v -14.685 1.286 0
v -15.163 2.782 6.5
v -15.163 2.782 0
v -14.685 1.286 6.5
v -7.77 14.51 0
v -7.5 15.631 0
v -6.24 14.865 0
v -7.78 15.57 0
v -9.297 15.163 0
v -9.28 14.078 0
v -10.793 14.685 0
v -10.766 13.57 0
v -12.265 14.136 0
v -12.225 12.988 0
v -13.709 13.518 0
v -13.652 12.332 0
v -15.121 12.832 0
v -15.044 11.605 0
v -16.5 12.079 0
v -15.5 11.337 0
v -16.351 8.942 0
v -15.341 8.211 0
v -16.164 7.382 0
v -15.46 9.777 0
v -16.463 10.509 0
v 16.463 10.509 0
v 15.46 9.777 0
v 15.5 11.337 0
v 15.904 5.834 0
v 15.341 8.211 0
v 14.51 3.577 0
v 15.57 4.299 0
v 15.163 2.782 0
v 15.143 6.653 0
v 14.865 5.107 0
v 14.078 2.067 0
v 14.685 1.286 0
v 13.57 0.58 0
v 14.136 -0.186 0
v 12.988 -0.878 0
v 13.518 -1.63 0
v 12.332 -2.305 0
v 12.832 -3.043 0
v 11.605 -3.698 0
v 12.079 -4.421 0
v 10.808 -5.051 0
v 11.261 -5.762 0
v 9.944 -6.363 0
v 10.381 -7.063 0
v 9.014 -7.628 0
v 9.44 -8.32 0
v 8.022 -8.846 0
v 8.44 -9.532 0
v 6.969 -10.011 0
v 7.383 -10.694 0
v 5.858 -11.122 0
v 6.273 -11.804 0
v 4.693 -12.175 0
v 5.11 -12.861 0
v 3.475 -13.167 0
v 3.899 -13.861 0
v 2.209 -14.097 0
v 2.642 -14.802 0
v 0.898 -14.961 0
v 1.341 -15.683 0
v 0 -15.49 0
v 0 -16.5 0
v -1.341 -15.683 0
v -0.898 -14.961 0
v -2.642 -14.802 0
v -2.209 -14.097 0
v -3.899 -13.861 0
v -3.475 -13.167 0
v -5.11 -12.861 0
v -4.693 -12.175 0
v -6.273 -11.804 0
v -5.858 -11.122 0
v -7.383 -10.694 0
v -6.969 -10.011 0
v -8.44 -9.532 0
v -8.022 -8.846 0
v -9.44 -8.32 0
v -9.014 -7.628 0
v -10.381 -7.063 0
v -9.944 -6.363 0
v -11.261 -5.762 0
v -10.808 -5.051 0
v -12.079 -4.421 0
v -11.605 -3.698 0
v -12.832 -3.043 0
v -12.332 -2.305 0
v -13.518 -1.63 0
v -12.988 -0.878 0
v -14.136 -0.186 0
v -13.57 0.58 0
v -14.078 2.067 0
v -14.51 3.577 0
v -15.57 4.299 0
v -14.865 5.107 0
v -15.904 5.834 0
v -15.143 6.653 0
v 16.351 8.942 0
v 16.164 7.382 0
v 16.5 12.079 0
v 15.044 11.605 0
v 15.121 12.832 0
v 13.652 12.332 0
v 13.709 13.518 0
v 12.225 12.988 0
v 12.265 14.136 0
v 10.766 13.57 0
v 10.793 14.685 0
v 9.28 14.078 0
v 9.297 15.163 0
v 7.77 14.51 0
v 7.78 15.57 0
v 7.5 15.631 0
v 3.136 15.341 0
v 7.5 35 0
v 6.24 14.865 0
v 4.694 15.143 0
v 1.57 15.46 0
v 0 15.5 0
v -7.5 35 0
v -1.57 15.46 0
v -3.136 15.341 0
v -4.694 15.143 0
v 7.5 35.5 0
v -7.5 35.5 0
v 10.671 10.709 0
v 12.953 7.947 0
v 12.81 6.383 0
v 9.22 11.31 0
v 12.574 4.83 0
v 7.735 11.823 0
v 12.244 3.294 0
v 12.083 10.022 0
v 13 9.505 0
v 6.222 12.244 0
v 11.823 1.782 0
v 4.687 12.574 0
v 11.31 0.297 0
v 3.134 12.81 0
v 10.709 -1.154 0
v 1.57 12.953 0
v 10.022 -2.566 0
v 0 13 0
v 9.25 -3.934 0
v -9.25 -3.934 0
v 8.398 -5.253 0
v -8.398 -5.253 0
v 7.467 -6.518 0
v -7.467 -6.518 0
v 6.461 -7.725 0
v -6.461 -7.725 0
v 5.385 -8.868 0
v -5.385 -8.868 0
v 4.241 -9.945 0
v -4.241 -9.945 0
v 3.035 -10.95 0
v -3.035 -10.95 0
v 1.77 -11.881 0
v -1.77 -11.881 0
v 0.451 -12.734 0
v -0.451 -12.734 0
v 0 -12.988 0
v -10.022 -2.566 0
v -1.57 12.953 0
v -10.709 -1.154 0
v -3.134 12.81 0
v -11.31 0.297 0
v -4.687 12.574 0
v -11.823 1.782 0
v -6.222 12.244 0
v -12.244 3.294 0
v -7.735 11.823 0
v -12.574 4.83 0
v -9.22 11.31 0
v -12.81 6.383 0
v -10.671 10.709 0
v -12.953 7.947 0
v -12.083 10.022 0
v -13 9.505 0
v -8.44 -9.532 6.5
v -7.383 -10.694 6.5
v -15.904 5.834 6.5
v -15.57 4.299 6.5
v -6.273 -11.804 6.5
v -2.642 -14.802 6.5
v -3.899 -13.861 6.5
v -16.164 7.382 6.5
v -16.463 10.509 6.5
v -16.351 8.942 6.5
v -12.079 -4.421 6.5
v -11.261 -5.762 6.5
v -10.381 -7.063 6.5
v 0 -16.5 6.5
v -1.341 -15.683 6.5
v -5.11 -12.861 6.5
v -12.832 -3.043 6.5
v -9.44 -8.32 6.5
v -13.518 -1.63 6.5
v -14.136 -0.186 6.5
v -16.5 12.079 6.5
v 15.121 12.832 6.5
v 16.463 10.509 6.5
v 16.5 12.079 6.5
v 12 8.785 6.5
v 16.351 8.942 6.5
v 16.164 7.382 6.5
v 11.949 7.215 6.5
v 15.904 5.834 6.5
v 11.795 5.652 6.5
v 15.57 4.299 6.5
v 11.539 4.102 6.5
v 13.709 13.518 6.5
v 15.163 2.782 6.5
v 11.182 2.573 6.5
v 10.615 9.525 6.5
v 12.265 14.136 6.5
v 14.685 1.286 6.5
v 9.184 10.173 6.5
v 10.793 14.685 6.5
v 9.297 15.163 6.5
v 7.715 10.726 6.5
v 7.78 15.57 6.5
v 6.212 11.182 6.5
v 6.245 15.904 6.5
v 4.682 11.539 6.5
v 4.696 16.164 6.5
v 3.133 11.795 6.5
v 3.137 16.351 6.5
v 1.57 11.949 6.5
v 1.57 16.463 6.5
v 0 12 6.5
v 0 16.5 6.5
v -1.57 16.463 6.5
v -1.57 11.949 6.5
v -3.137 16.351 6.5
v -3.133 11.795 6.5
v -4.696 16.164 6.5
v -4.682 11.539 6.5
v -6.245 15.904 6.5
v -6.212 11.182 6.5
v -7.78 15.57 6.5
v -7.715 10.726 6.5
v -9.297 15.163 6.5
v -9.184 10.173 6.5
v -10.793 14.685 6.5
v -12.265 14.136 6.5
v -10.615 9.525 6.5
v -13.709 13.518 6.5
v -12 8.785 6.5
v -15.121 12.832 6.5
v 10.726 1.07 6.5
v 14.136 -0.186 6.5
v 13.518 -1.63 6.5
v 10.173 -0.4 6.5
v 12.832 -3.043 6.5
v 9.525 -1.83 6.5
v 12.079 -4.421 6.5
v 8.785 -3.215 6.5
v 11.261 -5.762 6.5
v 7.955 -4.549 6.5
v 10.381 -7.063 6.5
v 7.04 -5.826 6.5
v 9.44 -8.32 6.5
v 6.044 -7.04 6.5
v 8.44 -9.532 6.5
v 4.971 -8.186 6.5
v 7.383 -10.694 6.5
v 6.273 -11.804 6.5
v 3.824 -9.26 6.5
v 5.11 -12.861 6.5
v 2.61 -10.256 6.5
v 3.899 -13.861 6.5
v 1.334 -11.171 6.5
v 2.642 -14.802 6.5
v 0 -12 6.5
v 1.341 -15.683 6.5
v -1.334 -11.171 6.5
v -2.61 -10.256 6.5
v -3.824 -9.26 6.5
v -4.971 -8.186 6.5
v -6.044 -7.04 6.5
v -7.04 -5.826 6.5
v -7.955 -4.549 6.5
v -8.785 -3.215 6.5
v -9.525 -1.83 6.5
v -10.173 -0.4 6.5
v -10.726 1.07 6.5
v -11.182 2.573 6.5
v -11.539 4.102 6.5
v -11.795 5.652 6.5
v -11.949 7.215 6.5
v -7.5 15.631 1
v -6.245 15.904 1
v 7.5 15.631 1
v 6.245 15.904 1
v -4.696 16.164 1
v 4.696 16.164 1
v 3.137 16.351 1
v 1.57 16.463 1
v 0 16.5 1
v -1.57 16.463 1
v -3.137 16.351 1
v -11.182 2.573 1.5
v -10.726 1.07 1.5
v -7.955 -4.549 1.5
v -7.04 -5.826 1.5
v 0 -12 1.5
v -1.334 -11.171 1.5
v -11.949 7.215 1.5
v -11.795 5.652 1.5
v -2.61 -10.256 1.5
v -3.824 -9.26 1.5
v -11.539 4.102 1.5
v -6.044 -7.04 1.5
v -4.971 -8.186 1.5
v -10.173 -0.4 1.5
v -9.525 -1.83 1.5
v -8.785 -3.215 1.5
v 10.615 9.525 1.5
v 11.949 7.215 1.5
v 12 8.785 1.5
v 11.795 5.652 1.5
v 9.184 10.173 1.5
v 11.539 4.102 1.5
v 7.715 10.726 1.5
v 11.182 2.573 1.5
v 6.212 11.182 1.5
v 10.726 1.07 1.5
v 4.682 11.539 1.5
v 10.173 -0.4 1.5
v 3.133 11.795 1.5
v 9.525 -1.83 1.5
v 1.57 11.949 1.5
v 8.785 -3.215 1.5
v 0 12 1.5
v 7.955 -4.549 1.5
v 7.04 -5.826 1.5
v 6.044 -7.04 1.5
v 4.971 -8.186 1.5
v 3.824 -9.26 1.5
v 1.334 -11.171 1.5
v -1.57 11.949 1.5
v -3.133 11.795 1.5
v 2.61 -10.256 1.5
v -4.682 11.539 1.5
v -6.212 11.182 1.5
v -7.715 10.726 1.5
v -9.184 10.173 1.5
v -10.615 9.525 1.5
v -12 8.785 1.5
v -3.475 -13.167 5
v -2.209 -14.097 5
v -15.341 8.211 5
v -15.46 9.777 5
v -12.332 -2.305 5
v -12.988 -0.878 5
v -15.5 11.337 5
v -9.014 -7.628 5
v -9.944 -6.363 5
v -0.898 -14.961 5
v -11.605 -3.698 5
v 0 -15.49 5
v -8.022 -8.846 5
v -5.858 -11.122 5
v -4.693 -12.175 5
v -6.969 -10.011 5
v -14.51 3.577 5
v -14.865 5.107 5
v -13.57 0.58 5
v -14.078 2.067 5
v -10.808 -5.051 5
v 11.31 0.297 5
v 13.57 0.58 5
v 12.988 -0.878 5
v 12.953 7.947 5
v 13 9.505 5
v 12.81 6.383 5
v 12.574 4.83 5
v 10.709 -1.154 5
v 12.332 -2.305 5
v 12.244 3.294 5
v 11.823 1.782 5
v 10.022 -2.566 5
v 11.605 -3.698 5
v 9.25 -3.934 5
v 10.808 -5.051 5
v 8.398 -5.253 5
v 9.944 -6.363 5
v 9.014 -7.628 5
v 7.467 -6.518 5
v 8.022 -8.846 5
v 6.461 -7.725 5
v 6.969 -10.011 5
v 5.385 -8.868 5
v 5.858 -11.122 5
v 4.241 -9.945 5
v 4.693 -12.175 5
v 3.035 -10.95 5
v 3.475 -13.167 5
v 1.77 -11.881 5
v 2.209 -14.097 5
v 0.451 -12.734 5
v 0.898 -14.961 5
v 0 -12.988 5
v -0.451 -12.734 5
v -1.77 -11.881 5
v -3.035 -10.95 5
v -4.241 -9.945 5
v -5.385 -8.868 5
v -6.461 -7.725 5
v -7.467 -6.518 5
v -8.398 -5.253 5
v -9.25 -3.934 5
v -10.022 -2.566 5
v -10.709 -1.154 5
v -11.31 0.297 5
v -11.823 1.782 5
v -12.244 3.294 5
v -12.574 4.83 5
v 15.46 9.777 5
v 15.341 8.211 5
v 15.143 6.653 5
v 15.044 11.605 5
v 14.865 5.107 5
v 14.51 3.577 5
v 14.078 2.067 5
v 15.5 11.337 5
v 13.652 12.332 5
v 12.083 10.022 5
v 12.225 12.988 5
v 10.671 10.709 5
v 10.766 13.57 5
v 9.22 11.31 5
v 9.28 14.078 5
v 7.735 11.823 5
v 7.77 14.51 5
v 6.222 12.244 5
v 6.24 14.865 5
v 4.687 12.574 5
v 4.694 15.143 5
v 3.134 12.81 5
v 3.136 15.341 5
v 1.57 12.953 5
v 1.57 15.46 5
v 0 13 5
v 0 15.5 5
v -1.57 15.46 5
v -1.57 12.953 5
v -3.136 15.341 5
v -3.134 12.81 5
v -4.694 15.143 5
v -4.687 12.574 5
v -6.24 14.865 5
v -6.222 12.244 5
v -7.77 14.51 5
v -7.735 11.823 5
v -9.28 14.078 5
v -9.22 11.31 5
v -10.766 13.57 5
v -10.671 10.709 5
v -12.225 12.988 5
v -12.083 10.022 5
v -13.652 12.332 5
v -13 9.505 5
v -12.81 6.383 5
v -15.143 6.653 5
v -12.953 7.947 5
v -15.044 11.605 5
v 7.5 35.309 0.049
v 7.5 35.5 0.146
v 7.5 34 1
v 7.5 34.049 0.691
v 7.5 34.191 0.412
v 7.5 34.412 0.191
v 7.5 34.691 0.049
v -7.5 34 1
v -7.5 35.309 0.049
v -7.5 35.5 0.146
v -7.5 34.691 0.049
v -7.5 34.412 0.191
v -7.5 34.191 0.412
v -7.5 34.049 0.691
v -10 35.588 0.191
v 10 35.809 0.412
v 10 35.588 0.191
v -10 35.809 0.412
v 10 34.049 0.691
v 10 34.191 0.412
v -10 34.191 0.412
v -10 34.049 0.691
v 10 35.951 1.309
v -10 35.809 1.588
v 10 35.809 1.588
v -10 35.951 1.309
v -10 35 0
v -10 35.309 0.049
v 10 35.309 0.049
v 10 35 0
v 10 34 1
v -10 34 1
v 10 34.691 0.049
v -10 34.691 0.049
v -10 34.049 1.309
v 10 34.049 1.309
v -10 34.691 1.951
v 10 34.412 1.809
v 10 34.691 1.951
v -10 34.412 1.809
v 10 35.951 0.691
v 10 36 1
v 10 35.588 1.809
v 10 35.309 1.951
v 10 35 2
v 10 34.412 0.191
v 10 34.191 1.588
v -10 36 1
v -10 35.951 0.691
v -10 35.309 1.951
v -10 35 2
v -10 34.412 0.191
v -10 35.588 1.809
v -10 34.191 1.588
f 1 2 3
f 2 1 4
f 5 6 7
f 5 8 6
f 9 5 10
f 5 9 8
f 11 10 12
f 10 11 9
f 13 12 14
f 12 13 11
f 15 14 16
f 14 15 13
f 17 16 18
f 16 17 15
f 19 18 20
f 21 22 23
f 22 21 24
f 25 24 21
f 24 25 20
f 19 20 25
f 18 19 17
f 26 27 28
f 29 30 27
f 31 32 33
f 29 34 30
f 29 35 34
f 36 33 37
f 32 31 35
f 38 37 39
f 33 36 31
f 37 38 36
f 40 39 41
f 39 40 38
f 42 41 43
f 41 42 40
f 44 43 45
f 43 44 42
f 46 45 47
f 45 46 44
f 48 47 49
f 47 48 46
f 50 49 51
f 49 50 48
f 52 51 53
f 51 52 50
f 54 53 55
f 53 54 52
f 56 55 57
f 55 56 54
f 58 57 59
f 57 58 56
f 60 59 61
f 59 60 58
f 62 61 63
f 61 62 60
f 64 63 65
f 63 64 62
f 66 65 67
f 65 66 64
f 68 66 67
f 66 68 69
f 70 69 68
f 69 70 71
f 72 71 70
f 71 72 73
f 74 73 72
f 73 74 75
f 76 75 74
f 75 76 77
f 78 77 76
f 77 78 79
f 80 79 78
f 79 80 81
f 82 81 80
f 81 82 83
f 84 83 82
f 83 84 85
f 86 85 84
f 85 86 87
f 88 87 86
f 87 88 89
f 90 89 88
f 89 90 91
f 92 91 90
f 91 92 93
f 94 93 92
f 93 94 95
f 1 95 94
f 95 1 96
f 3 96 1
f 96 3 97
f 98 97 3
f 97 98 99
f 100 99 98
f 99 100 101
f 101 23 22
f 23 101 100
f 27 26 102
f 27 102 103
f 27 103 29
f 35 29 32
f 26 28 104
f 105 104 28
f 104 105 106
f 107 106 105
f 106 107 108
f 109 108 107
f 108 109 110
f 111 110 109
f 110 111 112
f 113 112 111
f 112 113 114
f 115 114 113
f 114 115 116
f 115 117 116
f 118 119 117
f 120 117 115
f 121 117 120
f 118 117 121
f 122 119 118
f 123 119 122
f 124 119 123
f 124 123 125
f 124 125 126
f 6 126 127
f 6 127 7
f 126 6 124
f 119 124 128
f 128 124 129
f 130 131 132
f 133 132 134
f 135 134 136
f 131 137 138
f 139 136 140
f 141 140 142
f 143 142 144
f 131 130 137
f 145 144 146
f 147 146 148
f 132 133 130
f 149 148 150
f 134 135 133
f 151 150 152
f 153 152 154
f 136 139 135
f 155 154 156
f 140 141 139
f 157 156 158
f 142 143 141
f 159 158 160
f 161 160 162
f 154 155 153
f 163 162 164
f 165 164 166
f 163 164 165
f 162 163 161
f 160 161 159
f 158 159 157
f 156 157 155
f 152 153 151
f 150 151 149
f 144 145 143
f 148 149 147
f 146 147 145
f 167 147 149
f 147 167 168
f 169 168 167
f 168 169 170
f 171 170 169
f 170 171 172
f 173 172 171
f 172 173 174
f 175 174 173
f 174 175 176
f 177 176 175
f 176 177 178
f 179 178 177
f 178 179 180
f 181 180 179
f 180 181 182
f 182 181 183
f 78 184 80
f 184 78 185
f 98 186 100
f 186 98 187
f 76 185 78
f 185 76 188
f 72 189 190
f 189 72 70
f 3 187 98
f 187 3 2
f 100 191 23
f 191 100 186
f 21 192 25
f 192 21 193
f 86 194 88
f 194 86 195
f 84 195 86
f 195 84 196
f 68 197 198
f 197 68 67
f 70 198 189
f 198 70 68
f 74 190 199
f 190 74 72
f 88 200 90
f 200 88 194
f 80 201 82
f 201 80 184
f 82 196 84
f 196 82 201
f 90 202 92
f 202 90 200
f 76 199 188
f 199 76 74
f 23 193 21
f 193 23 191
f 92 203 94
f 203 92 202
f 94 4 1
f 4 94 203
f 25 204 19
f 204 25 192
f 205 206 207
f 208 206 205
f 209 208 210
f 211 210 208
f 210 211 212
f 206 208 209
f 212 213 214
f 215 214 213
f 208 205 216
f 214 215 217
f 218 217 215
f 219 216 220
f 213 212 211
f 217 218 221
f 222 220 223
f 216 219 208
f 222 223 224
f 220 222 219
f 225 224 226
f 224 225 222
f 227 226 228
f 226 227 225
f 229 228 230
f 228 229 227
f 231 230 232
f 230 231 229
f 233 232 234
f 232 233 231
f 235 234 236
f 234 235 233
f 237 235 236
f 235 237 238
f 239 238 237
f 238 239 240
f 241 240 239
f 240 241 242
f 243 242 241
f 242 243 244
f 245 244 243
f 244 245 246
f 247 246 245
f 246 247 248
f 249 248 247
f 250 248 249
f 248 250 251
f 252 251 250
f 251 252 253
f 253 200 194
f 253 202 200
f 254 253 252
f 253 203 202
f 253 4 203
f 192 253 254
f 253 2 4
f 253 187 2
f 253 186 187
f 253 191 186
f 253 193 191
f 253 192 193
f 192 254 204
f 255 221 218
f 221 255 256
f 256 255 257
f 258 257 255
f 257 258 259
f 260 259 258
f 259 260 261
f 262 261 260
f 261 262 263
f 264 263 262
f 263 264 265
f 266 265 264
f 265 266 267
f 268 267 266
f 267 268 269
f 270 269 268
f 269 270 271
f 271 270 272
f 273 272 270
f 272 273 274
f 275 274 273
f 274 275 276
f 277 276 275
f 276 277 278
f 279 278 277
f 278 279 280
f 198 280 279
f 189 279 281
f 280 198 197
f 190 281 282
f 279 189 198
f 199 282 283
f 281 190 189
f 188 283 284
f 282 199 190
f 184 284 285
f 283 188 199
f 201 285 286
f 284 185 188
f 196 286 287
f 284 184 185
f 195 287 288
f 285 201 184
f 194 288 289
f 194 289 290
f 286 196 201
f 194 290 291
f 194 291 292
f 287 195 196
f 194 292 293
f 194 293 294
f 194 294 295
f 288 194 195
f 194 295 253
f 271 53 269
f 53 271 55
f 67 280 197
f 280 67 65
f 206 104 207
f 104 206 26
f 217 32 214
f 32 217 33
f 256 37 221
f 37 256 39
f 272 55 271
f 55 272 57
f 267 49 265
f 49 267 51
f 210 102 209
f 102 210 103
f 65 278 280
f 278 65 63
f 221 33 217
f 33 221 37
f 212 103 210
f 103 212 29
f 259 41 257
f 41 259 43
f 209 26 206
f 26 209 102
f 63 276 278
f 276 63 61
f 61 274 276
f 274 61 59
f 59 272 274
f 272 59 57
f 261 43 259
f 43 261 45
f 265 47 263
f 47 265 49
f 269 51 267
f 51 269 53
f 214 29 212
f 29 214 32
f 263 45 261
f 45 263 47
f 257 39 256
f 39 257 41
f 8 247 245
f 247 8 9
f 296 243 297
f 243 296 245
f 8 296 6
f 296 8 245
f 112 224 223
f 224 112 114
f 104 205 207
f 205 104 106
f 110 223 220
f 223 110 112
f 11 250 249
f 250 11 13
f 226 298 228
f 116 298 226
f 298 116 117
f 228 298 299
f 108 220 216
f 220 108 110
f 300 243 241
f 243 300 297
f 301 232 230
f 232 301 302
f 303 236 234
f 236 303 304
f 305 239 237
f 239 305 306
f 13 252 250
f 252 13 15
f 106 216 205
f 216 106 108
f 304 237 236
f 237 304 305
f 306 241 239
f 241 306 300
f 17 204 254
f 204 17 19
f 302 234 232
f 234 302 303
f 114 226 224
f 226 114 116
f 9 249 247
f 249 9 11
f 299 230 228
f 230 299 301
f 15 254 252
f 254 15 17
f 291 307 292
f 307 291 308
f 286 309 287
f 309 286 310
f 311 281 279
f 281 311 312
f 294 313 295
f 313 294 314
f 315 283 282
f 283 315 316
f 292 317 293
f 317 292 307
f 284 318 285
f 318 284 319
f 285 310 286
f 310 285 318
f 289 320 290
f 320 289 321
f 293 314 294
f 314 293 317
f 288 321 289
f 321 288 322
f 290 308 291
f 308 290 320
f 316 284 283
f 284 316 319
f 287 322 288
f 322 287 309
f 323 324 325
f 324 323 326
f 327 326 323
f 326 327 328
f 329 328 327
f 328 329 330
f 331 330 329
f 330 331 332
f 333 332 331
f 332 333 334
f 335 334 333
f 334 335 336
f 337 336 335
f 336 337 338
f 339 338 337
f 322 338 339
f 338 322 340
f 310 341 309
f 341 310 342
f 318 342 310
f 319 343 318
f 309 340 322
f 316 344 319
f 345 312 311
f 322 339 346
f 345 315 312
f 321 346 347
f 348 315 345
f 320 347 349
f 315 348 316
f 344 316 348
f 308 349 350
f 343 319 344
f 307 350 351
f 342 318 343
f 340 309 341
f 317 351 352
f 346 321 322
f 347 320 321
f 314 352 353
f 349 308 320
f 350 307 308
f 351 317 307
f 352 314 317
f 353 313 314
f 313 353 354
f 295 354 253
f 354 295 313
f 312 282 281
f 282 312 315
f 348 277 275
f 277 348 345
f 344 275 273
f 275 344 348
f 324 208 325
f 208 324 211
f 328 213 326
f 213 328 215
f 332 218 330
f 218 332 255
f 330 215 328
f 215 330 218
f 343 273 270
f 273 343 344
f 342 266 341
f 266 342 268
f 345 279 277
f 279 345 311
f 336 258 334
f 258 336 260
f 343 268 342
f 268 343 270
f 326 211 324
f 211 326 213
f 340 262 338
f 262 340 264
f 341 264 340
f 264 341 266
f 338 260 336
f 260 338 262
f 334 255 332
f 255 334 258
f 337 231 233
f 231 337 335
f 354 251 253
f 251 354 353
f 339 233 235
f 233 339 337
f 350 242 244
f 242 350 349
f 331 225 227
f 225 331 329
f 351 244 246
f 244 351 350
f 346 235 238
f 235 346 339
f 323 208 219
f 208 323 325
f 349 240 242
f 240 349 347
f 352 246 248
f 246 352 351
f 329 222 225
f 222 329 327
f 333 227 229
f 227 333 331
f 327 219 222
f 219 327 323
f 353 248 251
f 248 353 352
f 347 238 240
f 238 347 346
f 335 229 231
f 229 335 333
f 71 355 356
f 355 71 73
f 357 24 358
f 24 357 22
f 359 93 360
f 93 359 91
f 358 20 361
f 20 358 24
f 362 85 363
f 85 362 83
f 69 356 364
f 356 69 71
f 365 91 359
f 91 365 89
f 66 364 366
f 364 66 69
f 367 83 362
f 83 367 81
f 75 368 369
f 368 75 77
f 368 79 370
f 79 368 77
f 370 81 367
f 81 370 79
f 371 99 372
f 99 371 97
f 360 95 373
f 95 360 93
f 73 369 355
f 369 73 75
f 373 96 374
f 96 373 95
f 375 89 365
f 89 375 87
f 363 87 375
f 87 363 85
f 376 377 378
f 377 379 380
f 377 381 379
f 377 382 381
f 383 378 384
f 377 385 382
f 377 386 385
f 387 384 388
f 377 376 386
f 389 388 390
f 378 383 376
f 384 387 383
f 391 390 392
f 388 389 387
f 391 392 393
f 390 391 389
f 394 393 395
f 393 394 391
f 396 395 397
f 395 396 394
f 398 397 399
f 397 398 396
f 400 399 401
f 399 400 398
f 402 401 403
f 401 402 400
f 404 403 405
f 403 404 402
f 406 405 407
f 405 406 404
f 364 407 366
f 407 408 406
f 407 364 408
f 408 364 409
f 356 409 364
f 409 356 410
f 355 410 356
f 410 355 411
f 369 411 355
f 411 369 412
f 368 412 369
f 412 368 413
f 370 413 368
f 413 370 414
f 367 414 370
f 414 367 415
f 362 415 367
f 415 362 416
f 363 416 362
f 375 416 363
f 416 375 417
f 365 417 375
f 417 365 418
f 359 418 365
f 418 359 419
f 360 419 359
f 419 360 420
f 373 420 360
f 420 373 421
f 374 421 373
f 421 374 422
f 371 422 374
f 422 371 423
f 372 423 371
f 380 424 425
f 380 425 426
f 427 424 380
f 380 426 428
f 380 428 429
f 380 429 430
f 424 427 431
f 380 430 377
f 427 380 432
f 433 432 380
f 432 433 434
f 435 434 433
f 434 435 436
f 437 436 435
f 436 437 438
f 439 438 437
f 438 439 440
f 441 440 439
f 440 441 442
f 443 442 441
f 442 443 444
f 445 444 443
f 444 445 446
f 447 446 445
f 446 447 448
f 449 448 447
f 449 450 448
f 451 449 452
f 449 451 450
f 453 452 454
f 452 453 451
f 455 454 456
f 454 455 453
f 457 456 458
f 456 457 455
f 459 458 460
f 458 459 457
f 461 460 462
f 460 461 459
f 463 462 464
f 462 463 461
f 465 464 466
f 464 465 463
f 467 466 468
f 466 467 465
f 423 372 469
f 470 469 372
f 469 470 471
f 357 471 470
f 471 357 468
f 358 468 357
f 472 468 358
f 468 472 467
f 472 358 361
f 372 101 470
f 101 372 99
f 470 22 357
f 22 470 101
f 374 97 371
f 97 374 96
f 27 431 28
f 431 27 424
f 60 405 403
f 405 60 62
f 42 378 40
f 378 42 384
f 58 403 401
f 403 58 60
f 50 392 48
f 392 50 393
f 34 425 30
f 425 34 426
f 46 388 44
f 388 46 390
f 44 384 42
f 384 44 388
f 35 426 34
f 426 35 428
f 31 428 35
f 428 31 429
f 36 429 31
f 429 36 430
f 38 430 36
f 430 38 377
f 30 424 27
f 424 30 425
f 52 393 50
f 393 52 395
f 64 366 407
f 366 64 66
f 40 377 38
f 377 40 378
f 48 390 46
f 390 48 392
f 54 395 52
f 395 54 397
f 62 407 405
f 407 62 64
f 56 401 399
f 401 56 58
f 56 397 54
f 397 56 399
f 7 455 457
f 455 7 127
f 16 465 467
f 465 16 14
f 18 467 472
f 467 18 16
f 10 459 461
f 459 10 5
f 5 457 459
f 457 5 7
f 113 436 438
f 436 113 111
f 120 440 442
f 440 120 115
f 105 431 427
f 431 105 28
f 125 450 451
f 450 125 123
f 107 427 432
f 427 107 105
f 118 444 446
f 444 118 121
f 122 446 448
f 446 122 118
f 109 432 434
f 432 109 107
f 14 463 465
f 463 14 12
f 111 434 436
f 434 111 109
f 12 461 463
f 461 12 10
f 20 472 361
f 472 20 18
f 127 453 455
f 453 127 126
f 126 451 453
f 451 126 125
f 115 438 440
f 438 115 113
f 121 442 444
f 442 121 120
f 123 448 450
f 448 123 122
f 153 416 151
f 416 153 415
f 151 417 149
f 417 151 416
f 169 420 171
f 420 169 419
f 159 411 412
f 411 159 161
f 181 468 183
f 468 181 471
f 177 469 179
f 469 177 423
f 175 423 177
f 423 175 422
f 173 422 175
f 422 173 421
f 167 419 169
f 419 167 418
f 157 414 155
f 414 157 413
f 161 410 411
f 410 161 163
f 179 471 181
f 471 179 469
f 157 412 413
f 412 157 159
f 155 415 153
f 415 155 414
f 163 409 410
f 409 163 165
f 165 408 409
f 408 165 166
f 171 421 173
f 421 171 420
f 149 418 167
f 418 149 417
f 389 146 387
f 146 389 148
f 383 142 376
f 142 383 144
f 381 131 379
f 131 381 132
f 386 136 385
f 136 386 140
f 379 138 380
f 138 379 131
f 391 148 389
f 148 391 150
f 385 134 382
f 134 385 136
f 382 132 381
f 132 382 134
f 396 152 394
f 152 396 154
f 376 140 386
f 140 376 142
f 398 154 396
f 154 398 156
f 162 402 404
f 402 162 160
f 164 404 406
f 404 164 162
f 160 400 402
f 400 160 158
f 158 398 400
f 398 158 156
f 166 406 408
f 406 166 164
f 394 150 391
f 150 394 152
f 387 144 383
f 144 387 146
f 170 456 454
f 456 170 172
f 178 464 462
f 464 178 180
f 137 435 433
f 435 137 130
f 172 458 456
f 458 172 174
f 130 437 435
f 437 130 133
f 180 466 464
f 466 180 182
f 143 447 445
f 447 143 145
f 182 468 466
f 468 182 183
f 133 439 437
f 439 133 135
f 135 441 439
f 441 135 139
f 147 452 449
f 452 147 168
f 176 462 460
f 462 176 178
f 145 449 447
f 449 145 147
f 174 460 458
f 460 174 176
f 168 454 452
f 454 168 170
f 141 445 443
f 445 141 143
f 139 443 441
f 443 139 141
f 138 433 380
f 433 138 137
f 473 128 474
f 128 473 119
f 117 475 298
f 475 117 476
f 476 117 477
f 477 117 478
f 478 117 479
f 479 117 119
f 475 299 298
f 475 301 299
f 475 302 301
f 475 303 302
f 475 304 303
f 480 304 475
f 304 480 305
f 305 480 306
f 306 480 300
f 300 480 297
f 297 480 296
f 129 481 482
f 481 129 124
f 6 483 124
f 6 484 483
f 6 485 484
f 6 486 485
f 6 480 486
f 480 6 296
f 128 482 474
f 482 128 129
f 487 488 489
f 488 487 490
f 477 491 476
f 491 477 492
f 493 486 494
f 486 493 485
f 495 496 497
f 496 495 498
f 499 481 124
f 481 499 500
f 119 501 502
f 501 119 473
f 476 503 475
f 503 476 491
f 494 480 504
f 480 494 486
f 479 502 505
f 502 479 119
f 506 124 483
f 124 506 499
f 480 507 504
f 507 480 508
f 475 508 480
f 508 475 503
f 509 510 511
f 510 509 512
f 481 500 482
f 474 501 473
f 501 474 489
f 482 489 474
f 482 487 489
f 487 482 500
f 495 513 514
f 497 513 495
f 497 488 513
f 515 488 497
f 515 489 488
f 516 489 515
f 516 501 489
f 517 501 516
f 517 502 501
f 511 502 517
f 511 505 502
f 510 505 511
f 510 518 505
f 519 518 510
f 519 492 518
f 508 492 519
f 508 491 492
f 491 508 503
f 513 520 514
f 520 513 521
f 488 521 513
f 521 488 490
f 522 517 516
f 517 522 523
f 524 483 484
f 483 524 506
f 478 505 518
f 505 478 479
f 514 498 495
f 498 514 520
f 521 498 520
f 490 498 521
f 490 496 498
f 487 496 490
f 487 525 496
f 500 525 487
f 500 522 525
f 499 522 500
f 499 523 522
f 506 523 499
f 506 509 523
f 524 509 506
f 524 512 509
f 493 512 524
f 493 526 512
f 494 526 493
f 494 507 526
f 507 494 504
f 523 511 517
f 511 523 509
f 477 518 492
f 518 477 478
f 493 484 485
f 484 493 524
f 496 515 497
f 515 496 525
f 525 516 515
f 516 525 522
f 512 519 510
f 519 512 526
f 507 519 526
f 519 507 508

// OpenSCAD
module borderRoundedTriangle(height,size) {
  sPos = size/2;
  yPos = sqrt((size*size)-(sPos*sPos))-sPos;
  translate([0,-(sPos-yPos),0])
  intersection() {
    translate([sPos,sPos,0]) cylinder(h=height, d=size*2, $fn=size*4);
    translate([-sPos,sPos,0]) cylinder(h=height, d=size*2, $fn=size*4);
    translate([0,-yPos,0]) cylinder(h=height, d=size*2, $fn=size*4);
  }
}

difference() {
  borderRoundedTriangle(6.5,33);

  translate([0,0,1.5]) borderRoundedTriangle(5,24);

  difference() {
    borderRoundedTriangle(5,31);
    borderRoundedTriangle(5,26);
  }
}

translate([0,25.5,0])
difference() {
  translate([0,0,0.5]) cube([15,20,1], center=true);
  translate([0,-42.5,0]) cylinder(h=1, d=66, $fn=80);
}

translate([-10,35,1]) rotate([0, 90, 0]) cylinder(h=20, d=2, $fn=20)
translate([0,-12.3,0.5]) cube([4,3,1], center=true);
